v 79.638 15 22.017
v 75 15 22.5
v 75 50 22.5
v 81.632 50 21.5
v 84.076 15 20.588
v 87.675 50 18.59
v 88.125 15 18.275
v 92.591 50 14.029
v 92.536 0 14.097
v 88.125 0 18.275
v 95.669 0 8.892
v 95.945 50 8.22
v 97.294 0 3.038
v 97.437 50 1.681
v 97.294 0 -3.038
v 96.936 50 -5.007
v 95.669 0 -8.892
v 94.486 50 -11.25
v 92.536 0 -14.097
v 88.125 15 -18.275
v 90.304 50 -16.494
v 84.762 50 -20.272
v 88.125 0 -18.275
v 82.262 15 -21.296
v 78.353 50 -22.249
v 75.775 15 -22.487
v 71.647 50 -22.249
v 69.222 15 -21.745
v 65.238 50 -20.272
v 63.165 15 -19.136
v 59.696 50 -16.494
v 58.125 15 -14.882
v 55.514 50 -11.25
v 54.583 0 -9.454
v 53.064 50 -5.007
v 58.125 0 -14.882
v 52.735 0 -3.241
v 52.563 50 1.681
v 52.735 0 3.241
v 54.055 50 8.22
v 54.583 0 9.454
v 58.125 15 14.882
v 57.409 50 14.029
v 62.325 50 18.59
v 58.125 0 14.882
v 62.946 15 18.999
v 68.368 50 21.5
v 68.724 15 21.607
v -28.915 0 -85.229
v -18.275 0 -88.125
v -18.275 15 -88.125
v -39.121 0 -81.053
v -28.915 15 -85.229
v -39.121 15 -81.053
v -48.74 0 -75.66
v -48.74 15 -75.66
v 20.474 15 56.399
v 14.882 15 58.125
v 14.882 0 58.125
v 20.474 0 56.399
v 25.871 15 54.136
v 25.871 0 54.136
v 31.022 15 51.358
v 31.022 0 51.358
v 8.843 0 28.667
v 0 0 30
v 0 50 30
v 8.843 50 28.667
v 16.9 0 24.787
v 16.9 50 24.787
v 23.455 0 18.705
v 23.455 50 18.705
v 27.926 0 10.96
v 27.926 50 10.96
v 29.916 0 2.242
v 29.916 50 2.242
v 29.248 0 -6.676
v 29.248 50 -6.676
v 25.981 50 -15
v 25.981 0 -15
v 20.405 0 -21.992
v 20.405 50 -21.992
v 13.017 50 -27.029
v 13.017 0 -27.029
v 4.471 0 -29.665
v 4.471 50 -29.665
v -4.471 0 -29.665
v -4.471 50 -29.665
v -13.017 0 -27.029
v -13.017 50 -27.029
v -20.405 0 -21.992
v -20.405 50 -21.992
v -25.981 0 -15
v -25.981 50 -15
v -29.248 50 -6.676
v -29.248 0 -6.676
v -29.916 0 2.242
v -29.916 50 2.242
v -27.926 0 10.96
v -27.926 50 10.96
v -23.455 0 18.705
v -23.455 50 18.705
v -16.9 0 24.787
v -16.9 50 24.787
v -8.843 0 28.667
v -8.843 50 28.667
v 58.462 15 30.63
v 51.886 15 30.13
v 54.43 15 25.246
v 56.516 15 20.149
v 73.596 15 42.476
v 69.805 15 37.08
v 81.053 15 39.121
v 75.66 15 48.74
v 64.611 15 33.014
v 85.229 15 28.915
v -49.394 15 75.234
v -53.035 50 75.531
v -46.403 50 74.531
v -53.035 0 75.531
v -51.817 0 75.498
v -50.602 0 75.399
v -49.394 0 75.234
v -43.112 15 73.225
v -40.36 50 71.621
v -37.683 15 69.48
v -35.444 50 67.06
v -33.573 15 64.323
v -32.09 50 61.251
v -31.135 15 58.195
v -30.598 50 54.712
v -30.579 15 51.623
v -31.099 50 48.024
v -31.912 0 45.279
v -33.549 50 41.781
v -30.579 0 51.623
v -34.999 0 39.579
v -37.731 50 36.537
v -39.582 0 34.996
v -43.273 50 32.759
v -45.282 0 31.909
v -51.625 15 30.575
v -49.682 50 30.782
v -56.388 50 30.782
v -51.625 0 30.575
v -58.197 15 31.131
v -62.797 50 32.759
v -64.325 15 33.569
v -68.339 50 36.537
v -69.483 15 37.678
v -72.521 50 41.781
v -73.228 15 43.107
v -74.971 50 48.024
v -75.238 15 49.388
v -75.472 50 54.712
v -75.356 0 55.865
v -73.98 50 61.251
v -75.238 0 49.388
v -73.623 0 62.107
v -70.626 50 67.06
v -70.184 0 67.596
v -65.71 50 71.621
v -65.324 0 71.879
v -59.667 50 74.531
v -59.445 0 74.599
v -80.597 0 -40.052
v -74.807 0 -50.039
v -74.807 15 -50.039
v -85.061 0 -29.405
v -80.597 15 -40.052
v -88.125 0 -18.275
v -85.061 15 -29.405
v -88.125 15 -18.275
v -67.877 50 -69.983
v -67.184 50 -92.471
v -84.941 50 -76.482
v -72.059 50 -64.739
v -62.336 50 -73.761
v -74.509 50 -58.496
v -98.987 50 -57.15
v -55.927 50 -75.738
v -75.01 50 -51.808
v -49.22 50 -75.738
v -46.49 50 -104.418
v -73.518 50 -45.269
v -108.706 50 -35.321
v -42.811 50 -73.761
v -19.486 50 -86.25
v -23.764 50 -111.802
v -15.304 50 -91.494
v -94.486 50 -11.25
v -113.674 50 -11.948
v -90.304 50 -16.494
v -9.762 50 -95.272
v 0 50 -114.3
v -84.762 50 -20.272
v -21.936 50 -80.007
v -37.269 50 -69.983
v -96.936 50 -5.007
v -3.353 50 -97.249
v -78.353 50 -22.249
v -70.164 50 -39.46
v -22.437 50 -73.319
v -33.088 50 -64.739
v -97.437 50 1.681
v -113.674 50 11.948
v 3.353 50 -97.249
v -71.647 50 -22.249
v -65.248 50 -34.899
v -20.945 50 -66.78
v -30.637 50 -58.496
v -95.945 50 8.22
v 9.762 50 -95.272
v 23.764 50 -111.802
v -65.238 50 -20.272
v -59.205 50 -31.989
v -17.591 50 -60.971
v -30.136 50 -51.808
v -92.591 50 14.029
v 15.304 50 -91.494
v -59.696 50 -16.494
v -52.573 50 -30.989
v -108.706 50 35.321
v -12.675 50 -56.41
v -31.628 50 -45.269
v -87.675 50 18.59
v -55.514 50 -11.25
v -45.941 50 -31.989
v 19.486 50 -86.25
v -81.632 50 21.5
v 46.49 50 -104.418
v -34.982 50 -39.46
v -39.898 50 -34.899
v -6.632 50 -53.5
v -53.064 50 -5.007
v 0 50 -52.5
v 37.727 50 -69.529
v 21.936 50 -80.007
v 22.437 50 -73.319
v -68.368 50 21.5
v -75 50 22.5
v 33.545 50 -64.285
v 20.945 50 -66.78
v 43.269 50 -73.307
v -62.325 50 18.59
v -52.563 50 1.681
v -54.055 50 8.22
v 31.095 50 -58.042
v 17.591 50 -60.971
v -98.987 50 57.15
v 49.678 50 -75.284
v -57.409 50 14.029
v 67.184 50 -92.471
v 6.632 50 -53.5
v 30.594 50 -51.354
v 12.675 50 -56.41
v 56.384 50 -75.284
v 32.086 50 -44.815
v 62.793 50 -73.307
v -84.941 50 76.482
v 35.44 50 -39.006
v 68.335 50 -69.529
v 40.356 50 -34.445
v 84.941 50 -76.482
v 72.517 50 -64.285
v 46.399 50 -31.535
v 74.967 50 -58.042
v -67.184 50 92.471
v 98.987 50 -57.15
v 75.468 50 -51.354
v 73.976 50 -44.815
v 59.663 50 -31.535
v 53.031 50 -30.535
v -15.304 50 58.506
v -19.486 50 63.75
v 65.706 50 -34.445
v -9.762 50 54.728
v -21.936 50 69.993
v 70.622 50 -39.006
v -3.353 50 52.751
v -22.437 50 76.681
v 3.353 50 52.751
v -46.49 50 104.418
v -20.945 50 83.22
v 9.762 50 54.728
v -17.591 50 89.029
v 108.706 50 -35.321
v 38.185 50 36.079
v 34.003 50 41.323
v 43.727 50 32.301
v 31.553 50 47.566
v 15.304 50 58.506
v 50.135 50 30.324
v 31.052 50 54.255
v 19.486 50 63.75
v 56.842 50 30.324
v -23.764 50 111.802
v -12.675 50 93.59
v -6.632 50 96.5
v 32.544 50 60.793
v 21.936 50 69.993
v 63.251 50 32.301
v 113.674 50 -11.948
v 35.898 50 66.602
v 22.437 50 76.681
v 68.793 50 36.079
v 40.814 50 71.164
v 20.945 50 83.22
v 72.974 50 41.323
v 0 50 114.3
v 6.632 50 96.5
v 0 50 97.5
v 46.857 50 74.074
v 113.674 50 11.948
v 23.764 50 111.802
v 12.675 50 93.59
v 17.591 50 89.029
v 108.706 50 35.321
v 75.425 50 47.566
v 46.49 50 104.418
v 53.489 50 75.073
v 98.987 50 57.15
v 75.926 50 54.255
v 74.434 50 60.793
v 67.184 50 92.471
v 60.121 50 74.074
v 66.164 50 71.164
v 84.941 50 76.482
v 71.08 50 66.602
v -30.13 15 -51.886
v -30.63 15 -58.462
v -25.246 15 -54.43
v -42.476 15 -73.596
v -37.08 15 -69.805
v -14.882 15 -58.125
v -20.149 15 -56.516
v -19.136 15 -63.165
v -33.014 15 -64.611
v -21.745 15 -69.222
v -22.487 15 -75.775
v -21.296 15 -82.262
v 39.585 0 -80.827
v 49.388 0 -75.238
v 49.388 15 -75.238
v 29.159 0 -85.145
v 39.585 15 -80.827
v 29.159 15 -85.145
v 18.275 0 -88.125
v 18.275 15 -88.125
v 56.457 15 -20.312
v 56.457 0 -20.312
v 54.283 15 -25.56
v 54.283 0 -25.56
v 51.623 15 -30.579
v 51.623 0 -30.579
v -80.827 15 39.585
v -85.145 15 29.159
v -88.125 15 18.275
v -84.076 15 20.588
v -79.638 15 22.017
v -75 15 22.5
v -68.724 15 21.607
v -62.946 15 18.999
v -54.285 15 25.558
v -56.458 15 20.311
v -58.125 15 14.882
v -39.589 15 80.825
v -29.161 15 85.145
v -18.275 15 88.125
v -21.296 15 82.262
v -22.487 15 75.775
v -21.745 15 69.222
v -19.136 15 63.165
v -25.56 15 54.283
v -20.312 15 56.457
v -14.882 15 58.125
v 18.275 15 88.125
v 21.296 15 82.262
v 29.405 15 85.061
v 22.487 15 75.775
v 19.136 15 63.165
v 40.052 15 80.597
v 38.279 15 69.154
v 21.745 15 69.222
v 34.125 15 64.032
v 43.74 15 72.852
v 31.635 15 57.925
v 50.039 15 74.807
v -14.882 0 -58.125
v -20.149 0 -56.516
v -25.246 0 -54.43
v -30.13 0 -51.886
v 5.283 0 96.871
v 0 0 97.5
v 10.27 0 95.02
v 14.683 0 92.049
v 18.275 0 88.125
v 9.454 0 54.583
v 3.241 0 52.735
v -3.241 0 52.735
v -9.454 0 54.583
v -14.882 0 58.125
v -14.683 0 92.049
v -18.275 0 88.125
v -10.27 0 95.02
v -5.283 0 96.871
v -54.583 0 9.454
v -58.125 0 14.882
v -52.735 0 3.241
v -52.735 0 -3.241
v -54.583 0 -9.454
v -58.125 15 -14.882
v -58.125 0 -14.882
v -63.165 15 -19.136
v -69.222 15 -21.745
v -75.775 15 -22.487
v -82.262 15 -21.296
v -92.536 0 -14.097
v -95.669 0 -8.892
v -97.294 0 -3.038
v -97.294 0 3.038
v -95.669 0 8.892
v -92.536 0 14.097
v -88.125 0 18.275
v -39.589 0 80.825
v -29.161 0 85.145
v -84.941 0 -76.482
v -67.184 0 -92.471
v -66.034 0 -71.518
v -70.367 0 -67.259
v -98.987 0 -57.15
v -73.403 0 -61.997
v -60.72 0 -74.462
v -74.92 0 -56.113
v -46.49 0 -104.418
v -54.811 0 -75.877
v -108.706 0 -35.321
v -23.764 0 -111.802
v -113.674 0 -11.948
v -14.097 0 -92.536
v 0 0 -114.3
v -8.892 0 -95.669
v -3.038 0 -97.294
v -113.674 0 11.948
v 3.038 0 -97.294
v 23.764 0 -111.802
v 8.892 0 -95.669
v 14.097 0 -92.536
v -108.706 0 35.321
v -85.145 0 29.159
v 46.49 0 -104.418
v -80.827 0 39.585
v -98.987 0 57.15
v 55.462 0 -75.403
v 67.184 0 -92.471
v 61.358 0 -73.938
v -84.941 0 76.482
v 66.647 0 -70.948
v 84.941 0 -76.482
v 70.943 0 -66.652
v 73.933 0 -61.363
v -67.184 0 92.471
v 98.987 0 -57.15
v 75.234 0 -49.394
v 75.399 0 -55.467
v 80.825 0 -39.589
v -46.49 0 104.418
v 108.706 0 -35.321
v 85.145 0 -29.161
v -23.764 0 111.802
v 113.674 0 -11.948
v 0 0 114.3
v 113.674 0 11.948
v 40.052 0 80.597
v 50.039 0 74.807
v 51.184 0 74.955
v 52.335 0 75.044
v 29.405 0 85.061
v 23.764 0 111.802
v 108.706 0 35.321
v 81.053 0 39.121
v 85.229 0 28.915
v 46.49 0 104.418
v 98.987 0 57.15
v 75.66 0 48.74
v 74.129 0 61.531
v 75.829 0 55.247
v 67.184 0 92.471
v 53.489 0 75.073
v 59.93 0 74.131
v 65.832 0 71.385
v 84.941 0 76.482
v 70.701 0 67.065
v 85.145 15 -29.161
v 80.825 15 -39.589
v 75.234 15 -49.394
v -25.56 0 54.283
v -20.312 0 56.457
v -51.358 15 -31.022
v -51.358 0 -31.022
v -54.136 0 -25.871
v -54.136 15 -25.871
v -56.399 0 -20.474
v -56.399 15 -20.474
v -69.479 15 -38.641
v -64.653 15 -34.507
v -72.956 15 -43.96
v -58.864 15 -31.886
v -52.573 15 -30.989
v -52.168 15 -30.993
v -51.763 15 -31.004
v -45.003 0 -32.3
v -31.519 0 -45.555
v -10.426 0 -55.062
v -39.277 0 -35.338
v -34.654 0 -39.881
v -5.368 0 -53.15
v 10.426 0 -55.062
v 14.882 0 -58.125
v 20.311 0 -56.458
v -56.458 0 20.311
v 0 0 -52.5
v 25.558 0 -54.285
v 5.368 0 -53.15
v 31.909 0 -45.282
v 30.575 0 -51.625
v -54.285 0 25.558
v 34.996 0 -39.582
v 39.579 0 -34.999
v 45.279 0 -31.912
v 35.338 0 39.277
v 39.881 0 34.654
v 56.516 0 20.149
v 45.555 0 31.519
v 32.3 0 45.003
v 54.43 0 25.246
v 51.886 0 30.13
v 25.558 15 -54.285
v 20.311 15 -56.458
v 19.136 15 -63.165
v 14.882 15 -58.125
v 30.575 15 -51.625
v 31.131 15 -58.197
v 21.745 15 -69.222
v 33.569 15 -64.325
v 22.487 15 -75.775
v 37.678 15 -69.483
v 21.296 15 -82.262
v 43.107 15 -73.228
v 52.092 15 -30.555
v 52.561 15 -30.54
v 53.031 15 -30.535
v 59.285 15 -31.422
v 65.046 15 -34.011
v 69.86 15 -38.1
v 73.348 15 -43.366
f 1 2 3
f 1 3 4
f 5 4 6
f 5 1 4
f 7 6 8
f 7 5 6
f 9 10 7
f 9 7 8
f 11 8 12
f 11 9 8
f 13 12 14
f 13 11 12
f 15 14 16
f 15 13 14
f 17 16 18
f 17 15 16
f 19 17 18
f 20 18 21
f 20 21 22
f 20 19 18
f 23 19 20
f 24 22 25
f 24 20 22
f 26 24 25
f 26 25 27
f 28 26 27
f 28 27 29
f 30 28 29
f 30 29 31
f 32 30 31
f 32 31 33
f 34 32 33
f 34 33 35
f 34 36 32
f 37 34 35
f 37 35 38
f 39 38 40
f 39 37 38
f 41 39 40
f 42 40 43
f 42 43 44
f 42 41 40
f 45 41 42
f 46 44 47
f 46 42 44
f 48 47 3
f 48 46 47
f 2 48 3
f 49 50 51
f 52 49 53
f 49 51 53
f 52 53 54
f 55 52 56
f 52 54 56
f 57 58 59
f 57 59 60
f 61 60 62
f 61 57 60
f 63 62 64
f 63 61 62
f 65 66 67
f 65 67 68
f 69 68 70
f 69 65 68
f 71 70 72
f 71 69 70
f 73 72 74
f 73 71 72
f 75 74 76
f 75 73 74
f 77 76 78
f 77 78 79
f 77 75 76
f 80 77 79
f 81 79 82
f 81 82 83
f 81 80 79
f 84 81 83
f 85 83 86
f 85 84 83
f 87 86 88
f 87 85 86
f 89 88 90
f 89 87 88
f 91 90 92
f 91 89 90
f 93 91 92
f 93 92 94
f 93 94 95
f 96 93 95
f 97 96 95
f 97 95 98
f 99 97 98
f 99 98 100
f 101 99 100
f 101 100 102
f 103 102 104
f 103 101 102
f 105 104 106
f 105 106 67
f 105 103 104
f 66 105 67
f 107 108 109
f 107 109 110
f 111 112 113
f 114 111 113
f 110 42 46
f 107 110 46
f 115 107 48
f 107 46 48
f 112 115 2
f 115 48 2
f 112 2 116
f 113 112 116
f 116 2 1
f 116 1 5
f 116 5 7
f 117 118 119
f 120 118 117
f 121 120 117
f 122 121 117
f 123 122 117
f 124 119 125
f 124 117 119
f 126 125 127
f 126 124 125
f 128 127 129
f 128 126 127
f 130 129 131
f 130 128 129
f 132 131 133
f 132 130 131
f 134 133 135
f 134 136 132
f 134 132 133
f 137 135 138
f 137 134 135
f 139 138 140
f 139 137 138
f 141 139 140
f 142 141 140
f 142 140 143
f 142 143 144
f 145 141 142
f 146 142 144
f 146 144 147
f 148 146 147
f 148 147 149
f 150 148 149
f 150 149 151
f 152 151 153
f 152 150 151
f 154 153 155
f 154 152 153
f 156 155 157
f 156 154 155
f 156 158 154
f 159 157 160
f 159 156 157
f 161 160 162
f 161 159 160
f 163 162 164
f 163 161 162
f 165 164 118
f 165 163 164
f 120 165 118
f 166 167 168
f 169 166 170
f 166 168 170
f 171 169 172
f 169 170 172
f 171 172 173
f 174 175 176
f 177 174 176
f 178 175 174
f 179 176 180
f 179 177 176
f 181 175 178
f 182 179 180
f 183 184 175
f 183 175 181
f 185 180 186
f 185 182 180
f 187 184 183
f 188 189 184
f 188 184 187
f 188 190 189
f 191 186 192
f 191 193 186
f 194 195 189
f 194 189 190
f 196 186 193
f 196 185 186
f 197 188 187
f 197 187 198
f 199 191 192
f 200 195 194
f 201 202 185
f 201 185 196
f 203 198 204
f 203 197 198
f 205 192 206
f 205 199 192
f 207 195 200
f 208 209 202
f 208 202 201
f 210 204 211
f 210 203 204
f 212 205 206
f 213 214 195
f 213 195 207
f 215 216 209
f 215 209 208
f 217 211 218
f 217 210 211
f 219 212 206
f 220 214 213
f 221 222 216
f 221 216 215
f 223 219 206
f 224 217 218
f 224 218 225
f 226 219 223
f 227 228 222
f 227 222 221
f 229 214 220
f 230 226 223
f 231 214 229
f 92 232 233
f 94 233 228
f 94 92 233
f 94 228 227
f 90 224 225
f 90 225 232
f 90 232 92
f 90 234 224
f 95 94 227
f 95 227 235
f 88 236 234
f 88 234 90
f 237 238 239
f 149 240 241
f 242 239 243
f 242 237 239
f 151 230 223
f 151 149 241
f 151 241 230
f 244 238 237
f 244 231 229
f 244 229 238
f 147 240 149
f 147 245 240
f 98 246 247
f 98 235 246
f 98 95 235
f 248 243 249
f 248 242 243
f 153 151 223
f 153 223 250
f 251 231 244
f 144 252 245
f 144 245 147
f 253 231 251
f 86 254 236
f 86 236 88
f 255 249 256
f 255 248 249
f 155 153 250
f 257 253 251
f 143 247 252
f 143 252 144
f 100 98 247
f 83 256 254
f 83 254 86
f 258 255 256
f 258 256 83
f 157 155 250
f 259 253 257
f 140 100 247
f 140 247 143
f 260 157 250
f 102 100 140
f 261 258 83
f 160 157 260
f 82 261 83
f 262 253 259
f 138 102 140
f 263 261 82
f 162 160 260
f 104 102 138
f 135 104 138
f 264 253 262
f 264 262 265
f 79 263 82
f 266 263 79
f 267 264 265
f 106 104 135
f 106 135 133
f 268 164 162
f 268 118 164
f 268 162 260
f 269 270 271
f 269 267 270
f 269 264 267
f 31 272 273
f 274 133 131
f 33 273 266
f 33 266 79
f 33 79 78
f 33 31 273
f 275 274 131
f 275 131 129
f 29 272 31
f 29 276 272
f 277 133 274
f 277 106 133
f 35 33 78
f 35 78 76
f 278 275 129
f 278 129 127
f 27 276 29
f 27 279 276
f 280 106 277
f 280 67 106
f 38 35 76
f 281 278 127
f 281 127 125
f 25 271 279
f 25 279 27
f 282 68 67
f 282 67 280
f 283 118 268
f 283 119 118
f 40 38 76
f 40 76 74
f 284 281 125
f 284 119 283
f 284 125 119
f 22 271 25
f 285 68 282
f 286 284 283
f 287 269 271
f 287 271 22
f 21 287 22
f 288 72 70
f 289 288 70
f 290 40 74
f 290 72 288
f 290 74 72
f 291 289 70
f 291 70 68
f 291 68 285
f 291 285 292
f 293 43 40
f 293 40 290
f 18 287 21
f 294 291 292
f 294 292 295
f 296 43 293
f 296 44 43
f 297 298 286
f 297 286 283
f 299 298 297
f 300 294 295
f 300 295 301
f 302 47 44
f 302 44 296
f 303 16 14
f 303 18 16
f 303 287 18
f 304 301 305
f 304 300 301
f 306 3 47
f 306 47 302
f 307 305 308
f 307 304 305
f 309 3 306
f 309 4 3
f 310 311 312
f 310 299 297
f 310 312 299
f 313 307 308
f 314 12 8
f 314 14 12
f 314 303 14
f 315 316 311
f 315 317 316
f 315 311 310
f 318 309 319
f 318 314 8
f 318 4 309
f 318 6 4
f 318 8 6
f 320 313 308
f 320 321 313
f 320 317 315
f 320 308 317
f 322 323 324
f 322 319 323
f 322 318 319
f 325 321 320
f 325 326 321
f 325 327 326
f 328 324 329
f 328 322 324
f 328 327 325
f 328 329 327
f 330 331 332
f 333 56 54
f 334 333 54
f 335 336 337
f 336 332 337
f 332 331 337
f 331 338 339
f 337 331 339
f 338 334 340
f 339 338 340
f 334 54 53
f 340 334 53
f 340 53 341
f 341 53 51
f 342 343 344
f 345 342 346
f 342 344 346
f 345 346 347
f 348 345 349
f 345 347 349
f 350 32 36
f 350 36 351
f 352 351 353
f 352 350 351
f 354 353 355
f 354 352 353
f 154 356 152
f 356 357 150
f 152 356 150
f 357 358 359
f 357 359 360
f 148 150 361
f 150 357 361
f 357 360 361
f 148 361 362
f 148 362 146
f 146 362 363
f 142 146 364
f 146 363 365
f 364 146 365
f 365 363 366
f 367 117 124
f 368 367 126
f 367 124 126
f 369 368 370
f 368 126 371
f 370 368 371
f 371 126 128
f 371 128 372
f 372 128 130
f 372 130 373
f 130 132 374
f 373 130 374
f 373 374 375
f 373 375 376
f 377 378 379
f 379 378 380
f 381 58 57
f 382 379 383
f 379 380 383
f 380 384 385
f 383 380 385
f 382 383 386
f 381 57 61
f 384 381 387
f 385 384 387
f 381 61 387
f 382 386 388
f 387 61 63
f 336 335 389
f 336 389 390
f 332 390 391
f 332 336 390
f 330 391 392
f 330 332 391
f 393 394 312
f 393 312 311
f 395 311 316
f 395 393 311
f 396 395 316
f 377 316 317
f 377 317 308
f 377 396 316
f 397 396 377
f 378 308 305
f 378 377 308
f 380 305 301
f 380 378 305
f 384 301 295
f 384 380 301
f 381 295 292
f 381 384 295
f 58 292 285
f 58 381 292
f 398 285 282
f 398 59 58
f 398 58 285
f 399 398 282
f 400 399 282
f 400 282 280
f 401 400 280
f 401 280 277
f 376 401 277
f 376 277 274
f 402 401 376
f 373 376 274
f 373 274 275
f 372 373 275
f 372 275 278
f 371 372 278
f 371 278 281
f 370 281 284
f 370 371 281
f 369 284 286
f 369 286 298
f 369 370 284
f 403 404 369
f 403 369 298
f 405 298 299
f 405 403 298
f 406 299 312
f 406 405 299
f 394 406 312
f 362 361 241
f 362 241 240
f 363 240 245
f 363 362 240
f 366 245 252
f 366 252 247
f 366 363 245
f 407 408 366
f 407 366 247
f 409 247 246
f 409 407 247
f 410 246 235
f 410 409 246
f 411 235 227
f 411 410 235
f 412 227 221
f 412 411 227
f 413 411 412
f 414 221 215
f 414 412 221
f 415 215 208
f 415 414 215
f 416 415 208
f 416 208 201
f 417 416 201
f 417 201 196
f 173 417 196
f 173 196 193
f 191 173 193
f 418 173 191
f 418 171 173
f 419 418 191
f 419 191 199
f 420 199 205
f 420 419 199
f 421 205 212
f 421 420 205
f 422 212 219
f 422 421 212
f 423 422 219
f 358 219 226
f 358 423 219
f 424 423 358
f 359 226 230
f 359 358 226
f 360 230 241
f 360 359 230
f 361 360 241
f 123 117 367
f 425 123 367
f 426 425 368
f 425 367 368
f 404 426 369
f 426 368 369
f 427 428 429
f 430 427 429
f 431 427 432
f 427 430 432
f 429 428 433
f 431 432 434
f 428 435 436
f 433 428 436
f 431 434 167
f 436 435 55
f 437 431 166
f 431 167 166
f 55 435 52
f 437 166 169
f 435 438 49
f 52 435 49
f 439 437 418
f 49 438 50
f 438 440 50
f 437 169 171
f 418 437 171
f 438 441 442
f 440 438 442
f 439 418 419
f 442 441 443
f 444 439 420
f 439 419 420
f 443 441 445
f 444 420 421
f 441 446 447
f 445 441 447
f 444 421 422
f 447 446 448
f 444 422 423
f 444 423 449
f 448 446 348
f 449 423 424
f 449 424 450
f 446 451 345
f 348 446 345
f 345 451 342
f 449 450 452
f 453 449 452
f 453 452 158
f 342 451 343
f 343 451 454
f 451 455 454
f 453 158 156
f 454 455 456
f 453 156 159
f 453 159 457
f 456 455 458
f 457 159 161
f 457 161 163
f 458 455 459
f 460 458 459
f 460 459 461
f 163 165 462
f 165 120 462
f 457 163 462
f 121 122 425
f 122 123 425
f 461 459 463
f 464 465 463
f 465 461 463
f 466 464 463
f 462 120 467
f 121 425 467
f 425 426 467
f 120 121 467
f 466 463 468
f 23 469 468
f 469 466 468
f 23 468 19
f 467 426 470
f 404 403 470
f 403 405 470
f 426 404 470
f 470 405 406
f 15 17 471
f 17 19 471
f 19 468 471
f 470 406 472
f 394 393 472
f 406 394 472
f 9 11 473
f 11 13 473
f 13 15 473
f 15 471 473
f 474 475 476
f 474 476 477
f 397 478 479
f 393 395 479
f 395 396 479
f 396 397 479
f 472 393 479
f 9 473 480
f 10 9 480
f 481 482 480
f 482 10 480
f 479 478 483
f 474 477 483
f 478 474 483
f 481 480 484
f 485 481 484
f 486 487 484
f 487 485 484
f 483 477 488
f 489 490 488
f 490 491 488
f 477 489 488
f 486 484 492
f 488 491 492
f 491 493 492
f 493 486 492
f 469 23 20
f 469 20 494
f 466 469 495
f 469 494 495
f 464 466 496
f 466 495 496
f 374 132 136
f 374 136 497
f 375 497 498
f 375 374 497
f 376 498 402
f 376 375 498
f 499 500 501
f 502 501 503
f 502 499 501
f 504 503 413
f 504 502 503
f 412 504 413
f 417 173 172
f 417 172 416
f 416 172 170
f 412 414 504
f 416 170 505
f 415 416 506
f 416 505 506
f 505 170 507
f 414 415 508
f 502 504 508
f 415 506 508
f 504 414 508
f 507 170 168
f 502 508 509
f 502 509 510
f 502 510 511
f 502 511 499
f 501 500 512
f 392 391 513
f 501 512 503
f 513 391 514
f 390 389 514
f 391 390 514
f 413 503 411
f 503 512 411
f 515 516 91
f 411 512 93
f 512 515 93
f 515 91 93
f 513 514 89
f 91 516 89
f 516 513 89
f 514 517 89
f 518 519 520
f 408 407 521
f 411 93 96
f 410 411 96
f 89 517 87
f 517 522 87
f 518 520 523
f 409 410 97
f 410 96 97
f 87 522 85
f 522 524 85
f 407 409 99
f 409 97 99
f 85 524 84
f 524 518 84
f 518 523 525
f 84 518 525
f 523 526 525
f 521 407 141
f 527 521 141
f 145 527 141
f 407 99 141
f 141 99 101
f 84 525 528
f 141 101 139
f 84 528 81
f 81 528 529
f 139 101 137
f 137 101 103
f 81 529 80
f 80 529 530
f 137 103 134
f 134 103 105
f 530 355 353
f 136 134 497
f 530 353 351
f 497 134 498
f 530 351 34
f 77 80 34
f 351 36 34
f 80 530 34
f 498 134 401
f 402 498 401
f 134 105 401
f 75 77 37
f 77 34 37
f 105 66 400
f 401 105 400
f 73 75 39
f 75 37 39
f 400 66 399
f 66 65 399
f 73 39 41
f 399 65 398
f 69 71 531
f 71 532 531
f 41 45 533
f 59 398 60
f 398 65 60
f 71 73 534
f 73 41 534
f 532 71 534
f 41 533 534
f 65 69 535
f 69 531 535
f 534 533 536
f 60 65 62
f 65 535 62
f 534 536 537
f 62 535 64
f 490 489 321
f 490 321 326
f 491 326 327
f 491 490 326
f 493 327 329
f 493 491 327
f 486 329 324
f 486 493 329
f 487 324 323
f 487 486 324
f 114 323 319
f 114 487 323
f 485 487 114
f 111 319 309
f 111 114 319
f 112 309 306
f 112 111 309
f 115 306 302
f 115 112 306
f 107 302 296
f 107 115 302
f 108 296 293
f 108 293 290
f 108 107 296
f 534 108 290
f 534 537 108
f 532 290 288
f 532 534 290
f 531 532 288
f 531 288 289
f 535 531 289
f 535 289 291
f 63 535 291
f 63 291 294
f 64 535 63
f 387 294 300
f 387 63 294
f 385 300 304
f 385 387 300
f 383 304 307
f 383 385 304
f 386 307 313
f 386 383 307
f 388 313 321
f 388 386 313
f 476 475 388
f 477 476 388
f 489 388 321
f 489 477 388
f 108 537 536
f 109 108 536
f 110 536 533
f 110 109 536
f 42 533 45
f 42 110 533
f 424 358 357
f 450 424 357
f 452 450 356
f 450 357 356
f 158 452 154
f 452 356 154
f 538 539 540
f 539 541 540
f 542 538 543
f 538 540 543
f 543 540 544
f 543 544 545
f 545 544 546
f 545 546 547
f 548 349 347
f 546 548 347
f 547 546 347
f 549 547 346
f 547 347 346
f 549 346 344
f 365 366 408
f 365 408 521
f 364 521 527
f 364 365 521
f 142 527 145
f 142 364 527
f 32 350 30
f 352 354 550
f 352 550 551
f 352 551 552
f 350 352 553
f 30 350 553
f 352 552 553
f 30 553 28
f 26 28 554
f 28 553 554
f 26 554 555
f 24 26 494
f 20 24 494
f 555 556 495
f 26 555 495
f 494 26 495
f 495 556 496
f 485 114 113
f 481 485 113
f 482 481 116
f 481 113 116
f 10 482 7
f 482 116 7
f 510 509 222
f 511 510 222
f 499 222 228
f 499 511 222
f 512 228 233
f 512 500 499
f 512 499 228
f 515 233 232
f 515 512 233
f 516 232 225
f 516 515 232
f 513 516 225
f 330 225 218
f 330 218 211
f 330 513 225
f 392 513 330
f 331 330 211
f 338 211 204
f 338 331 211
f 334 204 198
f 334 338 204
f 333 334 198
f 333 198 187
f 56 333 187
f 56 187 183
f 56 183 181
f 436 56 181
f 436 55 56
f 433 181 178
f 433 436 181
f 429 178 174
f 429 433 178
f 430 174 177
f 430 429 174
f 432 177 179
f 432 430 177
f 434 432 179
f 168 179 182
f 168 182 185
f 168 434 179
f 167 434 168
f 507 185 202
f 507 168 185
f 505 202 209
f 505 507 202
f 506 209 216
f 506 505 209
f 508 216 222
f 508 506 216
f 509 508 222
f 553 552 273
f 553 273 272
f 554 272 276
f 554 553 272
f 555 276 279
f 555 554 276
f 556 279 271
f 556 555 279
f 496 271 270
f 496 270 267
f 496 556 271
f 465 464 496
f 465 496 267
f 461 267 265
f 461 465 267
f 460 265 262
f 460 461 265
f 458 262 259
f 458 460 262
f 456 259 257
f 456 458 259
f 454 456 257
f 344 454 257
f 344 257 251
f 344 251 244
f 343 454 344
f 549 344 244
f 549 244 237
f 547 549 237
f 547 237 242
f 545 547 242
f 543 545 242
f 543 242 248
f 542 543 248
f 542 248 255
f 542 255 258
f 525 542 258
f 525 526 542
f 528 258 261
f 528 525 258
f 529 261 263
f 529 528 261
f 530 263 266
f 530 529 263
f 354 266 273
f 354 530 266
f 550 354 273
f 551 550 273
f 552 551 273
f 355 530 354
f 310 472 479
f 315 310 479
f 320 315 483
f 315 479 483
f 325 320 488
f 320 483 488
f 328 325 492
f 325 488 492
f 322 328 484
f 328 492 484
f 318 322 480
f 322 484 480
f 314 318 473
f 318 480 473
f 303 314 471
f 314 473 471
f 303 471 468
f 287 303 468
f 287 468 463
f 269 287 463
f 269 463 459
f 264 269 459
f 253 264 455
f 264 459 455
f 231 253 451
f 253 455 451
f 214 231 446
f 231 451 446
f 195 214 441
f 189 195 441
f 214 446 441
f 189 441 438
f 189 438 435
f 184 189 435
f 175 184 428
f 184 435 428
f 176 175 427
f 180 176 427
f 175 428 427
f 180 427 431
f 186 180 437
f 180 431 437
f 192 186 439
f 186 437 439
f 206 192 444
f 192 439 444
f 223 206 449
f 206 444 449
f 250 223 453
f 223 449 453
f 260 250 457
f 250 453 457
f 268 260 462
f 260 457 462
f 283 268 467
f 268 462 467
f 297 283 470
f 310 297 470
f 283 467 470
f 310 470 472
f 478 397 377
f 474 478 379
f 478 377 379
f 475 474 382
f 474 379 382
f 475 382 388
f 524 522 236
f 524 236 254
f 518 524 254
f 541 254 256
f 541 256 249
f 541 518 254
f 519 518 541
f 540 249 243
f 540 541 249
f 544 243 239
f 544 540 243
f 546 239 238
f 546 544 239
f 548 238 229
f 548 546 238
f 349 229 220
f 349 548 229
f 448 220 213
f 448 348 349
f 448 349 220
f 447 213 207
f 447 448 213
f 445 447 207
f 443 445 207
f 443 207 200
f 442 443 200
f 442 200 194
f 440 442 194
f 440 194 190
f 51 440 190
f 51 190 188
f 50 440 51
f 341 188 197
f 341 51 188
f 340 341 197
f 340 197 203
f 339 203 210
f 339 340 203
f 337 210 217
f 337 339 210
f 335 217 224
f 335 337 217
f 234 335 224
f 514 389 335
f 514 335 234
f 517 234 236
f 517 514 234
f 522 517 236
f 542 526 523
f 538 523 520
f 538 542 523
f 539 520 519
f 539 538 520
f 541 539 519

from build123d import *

# Parameters (mm, degrees)
SKETCH1_R           = 114.3
SKETCH1_R_2         = 22.5
SKETCH1_R_3         = 30
BOSS_EXTRUDE1_DEPTH = 50
CUT_EXTRUDE1_START  = -35
SKETCH2_R           = 90
SKETCH2_R_2         = 60
CUT_EXTRUDE1_DEPTH  = 20


with BuildPart() as part:
    # Sketch1 → Boss-Extrude1 (new body)
    with BuildSketch(Plane(origin=(0, 0, 0), x_dir=(1, 0, 0), z_dir=(0, 1, 0))):
        with Locations(Location((0, 0, 0), (0, 0, 270))):
            Circle(SKETCH1_R)
        with Locations(Location((75, 0, 0), (0, 0, 270))):
            Circle(SKETCH1_R_2, mode=Mode.SUBTRACT)
        with Locations(Location((53.031031744, 53.03498536, 0), (0, 0, 270))):
            Circle(SKETCH1_R_2, mode=Mode.SUBTRACT)
        with Locations(Location((0, 75, 0), (0, 0, 270))):
            Circle(SKETCH1_R_2, mode=Mode.SUBTRACT)
        with Locations(Location((-52.573136336, 53.488927226, 0), (0, 0, 270))):
            Circle(SKETCH1_R_2, mode=Mode.SUBTRACT)
        with Locations(Location((-75, 0, 0), (0, 0, 270))):
            Circle(SKETCH1_R_2, mode=Mode.SUBTRACT)
        with Locations(Location((-53.03498536, -53.031031744, 0), (0, 0, 270))):
            Circle(SKETCH1_R_2, mode=Mode.SUBTRACT)
        with Locations(Location((0, -75, 0), (0, 0, 270))):
            Circle(SKETCH1_R_2, mode=Mode.SUBTRACT)
        with Locations(Location((53.488927226, -52.573136336, 0), (0, 0, 270))):
            Circle(SKETCH1_R_2, mode=Mode.SUBTRACT)
        with Locations(Location((0, 0, 0), (0, 0, 270))):
            Circle(SKETCH1_R_3, mode=Mode.SUBTRACT)
    extrude(amount=BOSS_EXTRUDE1_DEPTH)

    # Sketch2 → Cut-Extrude1 (cut)
    with BuildSketch(Plane(origin=(0, 50, 0), x_dir=(1, 0, 0), z_dir=(0, 1, 0)).offset(CUT_EXTRUDE1_START)):
        Circle(SKETCH2_R)
        Circle(SKETCH2_R_2, mode=Mode.SUBTRACT)
    extrude(amount=-CUT_EXTRUDE1_DEPTH, mode=Mode.SUBTRACT)


solid = part.part
